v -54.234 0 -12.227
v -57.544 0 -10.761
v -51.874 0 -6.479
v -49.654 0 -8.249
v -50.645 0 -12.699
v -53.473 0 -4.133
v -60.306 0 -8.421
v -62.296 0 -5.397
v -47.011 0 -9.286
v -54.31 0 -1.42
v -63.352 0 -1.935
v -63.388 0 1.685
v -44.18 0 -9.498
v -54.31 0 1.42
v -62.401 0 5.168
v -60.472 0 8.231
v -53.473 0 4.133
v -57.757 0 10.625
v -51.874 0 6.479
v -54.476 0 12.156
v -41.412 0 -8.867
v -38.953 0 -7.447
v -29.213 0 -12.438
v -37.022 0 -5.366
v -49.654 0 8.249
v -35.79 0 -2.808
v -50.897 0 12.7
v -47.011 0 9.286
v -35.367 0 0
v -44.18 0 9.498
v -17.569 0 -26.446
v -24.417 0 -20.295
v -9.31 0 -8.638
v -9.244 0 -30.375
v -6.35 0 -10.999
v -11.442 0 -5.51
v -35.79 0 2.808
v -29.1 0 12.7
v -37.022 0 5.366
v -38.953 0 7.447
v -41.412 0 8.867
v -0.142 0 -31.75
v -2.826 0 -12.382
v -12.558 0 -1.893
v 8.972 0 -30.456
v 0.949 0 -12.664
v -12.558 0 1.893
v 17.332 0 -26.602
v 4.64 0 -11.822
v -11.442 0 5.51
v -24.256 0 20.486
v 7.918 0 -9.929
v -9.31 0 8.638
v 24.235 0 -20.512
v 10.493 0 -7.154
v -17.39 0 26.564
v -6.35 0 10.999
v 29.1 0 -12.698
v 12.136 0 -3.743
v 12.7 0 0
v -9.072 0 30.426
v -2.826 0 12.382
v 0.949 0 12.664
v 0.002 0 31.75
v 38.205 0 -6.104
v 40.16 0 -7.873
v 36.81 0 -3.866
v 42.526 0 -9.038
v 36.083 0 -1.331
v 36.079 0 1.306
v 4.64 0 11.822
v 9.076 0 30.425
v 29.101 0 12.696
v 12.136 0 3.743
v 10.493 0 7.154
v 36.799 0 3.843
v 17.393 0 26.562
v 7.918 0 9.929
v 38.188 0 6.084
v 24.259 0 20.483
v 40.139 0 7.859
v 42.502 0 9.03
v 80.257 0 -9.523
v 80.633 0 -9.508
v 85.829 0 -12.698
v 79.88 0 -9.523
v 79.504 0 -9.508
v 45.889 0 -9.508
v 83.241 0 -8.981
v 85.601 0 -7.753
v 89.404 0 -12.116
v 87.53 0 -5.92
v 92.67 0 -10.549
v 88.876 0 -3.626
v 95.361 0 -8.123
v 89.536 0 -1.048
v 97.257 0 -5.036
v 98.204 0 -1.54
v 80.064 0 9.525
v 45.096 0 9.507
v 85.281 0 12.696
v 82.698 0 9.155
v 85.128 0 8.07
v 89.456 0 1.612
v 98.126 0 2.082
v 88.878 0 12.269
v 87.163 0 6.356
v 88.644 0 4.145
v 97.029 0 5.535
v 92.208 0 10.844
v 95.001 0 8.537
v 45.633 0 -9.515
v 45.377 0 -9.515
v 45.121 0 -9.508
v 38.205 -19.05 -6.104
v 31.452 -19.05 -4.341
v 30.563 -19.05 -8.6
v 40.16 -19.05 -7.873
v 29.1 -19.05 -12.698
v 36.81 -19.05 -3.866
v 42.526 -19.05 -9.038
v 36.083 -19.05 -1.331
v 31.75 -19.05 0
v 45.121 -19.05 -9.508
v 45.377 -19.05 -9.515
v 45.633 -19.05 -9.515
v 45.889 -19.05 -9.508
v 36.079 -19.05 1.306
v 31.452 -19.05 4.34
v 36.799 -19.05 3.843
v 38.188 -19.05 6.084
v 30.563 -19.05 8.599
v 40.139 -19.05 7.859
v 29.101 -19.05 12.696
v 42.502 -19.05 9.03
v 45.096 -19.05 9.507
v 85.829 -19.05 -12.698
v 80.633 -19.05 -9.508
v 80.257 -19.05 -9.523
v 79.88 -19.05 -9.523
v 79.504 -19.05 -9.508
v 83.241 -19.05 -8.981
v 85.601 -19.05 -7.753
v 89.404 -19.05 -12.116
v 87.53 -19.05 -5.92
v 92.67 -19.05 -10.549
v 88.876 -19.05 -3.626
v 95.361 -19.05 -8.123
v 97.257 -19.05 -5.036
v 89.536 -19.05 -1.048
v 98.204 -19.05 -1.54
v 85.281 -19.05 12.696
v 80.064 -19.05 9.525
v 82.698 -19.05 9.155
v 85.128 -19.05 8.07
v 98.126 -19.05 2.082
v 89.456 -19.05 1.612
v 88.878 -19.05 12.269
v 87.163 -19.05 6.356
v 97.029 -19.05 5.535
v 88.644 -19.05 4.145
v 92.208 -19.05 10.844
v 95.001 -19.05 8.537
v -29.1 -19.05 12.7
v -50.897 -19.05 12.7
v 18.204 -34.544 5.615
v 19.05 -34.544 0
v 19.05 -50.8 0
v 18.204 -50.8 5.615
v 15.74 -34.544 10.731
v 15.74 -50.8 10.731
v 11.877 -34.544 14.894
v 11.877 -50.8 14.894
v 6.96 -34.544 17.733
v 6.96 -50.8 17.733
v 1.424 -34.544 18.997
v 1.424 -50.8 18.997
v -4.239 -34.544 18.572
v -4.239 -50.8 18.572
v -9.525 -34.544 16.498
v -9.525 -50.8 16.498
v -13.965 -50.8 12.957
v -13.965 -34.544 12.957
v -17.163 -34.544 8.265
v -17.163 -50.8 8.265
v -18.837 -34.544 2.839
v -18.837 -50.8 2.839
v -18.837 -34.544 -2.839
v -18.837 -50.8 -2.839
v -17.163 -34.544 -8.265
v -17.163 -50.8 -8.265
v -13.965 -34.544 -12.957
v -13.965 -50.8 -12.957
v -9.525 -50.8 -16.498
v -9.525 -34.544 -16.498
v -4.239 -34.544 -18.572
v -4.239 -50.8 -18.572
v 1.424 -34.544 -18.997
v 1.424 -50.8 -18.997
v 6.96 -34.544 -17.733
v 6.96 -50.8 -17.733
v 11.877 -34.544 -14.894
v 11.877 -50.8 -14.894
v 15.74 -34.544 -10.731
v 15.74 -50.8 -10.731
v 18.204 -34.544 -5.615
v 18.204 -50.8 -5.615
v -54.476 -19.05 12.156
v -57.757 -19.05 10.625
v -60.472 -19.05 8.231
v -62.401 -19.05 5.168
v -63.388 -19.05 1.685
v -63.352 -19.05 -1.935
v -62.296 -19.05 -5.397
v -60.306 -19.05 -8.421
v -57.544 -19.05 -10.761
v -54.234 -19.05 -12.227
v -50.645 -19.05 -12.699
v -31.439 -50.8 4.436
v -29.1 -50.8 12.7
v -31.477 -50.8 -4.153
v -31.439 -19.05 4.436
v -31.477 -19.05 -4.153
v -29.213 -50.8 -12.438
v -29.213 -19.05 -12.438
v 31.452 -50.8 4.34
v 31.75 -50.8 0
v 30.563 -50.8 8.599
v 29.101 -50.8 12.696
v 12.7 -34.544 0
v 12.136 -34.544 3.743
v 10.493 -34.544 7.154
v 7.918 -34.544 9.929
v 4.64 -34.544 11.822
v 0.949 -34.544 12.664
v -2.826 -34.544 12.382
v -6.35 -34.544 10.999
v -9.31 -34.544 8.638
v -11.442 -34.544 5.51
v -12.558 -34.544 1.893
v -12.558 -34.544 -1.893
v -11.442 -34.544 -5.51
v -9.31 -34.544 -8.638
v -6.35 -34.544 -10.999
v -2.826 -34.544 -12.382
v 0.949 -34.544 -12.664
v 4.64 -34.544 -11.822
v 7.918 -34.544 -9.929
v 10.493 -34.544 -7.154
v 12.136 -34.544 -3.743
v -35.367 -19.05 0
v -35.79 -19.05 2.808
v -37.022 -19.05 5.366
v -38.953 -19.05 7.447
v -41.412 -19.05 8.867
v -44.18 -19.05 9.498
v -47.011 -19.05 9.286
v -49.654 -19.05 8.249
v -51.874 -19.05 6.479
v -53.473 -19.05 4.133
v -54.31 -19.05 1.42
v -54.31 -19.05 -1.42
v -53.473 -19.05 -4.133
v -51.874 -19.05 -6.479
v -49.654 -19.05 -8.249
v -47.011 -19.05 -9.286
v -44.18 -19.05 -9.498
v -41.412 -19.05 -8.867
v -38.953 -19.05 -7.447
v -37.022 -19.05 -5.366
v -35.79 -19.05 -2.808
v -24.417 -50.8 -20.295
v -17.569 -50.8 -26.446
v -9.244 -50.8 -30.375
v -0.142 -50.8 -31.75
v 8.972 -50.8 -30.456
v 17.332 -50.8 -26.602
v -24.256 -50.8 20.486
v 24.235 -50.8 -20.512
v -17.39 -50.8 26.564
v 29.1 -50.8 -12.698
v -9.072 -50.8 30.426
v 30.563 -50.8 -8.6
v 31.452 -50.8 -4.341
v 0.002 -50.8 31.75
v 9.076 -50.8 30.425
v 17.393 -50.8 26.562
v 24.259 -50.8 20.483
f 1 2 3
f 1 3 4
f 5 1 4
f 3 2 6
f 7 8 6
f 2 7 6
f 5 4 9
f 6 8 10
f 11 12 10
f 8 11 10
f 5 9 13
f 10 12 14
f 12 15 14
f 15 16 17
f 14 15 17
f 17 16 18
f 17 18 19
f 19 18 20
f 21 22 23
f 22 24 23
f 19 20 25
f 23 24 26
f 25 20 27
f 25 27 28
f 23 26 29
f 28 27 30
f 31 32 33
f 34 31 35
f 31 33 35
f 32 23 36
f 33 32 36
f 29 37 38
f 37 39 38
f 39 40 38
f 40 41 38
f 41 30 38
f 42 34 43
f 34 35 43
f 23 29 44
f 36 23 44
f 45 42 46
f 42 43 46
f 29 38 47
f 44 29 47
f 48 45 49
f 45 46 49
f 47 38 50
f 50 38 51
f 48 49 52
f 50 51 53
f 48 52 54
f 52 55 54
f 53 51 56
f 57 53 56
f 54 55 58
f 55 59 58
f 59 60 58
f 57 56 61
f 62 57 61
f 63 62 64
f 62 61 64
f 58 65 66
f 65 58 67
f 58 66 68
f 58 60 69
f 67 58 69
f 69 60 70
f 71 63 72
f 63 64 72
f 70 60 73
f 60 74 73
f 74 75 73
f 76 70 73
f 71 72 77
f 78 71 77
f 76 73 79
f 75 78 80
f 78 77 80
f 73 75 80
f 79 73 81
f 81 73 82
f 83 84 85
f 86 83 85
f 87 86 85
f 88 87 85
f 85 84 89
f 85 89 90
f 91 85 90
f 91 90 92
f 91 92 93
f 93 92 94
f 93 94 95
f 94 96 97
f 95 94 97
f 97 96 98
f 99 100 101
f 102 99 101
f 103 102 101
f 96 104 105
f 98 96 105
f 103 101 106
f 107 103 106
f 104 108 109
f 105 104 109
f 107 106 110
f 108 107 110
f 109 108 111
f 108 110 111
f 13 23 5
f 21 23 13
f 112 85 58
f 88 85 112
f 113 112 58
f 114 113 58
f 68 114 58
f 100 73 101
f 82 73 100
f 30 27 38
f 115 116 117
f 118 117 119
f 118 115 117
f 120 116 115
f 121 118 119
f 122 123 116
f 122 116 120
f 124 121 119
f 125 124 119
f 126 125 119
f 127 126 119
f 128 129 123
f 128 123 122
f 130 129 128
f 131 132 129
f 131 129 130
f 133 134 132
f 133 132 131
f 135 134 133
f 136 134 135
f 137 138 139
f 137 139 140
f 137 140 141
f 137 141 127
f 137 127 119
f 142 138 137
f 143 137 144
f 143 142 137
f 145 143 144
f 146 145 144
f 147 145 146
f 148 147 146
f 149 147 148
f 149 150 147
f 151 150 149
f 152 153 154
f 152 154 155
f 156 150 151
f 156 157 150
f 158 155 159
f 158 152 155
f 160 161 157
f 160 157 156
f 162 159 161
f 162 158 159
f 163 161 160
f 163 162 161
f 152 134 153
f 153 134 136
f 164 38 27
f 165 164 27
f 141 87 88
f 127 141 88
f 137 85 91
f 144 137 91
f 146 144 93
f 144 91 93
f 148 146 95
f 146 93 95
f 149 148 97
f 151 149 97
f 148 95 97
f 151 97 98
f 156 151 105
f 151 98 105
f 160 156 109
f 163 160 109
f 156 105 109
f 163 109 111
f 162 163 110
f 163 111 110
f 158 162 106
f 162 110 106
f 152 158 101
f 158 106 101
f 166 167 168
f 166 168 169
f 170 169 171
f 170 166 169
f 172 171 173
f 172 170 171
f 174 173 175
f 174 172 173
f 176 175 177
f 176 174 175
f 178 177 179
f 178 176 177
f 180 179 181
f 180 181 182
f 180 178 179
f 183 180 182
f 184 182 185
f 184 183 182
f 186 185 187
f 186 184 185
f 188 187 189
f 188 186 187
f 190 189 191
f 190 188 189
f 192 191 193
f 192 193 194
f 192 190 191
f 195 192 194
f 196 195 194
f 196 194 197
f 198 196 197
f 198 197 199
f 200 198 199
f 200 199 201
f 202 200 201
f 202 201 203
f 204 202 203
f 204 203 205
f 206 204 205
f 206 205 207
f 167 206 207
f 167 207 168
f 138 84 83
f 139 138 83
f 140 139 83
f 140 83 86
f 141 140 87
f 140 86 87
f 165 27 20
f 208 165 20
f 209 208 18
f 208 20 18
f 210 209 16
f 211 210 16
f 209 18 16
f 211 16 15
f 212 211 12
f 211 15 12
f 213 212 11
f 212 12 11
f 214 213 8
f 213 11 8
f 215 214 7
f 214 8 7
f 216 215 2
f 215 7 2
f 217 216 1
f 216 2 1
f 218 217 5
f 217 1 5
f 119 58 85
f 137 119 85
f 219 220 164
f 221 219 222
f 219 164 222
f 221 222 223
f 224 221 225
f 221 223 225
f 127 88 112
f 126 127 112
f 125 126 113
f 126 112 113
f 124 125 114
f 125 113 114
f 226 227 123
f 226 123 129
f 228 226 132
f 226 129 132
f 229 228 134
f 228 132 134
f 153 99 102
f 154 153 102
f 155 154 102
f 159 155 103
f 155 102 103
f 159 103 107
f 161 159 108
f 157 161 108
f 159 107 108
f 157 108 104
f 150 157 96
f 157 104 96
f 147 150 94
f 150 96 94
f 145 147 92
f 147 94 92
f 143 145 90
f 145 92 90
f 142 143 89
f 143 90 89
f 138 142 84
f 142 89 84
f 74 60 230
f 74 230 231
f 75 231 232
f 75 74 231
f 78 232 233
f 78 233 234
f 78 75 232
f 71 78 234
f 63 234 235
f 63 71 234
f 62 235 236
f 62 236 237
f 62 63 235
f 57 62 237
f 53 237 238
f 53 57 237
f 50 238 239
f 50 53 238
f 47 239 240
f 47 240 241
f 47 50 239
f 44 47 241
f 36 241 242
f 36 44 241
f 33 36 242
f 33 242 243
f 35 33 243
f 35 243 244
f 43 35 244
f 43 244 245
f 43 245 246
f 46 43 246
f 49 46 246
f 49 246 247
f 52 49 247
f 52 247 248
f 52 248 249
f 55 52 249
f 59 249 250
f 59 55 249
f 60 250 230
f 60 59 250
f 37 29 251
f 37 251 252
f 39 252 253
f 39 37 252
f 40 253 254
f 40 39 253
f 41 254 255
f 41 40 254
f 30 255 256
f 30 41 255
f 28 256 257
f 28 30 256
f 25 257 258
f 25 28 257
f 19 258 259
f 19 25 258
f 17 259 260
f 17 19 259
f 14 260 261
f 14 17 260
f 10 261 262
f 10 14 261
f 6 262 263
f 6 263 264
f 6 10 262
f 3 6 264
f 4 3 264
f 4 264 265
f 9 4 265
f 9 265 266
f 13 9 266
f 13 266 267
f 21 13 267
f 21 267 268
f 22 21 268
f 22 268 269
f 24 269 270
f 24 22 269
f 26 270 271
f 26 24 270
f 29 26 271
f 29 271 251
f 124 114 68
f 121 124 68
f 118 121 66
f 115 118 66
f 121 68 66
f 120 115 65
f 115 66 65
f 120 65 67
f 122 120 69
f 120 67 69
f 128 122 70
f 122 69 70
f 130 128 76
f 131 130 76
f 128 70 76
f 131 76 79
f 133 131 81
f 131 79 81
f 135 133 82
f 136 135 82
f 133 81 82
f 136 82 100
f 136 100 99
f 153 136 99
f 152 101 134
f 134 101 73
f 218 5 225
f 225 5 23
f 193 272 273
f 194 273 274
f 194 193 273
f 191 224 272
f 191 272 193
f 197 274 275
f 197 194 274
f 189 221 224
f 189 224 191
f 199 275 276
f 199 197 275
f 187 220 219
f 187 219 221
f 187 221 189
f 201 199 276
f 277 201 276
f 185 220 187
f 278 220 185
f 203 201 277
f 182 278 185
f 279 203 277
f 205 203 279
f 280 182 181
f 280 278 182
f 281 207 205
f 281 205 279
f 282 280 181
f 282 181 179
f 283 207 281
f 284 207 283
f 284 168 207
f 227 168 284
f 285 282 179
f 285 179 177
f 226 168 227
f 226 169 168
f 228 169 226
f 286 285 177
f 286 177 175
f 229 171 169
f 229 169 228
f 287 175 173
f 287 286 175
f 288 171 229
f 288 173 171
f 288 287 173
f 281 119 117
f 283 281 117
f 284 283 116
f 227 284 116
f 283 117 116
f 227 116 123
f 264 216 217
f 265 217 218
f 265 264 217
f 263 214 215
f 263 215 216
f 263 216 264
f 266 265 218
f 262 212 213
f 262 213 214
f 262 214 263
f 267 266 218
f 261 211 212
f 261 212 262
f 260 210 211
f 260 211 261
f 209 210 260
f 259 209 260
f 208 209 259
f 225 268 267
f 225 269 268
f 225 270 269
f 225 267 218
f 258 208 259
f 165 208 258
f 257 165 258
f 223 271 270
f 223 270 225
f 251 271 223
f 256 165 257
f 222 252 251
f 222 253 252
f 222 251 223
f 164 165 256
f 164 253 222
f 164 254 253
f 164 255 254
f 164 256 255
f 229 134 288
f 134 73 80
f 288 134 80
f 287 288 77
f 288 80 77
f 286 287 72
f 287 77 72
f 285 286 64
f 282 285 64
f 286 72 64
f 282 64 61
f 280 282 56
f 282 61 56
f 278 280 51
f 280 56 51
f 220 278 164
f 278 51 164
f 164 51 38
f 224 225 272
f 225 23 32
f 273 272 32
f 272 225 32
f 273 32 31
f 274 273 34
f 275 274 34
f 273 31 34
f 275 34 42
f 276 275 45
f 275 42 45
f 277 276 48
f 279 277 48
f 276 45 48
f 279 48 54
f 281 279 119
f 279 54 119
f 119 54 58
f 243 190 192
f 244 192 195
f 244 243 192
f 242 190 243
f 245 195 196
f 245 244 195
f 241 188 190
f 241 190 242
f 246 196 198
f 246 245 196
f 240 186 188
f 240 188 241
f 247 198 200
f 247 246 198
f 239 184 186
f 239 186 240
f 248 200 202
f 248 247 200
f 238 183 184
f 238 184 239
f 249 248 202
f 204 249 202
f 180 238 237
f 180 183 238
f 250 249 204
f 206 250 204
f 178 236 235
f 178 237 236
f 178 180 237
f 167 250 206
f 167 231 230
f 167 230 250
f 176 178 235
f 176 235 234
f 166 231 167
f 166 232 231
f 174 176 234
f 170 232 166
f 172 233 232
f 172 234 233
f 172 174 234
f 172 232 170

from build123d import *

# Parameters (mm, degrees)
F0_R     = 19.05
F1_DEPTH = 50.8
F0_R_2   = 9.525
F2_DEPTH = 19.05
F0_R_3   = 12.7
F3_DEPTH = 34.544


with BuildPart() as f1:
    # F0 (on Front) → F1 (new body)
    with BuildSketch(Plane.XZ):
        with BuildLine():
            ThreePointArc((29.100271, -12.697902), (31.080509, -6.485711), (31.75, 0))
            ThreePointArc((31.75, 0), (31.080718, 6.484712), (29.101087, 12.696032))
            ThreePointArc((29.101087, 12.696032), (0.001961, 31.75), (-29.099518, 12.699628))
            ThreePointArc((-29.099518, 12.699628), (-31.749679, 0.142707), (-29.212504, -12.437529))
            ThreePointArc((-29.212504, -12.437529), (-0.141766, -31.749684), (29.100271, -12.697902))
        make_face()
        Circle(F0_R, mode=Mode.SUBTRACT)
    extrude(amount=F1_DEPTH)

    # F0 (on Front) → F2 (join)
    with BuildSketch(Plane.XZ):
        with BuildLine():
            ThreePointArc((-29.212504, -12.437529), (-31.749679, 0.142707), (-29.099518, 12.699628))
            Line((-29.099518, 12.699628), (-50.702789, 12.699628))
            Line((-50.702789, 12.699628), (-50.897211, 12.699628))
            ThreePointArc((-50.897211, 12.699628), (-63.499374, -0.126084), (-50.645043, -12.699055))
            Line((-50.645043, -12.699055), (-29.212504, -12.437529))
        make_face()
        with Locations((-44.891737, 0)):
            Circle(F0_R_2, mode=Mode.SUBTRACT)
        with BuildLine():
            ThreePointArc((29.101087, 12.696032), (31.080718, 6.484712), (31.75, 0))
            ThreePointArc((31.75, 0), (31.080509, -6.485711), (29.100271, -12.697902))
            Line((29.100271, -12.697902), (85.367147, -12.697902))
            Line((85.367147, -12.697902), (85.828853, -12.697902))
            ThreePointArc((85.828853, -12.697902), (98.295041, 0.274142), (85.280573, 12.696032))
            Line((85.280573, 12.696032), (29.101087, 12.696032))
        make_face()
        with BuildLine():
            ThreePointArc((45.121247, -9.508264), (35.988966, -0.012772), (45.095725, 9.5072))
            Line((45.095725, 9.5072), (80.063554, 9.524999))
            ThreePointArc((80.063554, 9.524999), (89.589145, 0.284741), (80.63279, -9.508264))
            ThreePointArc((80.63279, -9.508264), (80.068402, -9.525), (79.504014, -9.508264))
            Line((79.504014, -9.508264), (45.888676, -9.508264))
            ThreePointArc((45.888676, -9.508264), (45.504961, -9.516004), (45.121247, -9.508264))
        make_face(mode=Mode.SUBTRACT)
    extrude(amount=F2_DEPTH)

    # F0 (on Front) → F3 (join)
    with BuildSketch(Plane.XZ):
        Circle(F0_R)
        Circle(F0_R_3, mode=Mode.SUBTRACT)
    extrude(amount=F3_DEPTH)


solid = f1.part
